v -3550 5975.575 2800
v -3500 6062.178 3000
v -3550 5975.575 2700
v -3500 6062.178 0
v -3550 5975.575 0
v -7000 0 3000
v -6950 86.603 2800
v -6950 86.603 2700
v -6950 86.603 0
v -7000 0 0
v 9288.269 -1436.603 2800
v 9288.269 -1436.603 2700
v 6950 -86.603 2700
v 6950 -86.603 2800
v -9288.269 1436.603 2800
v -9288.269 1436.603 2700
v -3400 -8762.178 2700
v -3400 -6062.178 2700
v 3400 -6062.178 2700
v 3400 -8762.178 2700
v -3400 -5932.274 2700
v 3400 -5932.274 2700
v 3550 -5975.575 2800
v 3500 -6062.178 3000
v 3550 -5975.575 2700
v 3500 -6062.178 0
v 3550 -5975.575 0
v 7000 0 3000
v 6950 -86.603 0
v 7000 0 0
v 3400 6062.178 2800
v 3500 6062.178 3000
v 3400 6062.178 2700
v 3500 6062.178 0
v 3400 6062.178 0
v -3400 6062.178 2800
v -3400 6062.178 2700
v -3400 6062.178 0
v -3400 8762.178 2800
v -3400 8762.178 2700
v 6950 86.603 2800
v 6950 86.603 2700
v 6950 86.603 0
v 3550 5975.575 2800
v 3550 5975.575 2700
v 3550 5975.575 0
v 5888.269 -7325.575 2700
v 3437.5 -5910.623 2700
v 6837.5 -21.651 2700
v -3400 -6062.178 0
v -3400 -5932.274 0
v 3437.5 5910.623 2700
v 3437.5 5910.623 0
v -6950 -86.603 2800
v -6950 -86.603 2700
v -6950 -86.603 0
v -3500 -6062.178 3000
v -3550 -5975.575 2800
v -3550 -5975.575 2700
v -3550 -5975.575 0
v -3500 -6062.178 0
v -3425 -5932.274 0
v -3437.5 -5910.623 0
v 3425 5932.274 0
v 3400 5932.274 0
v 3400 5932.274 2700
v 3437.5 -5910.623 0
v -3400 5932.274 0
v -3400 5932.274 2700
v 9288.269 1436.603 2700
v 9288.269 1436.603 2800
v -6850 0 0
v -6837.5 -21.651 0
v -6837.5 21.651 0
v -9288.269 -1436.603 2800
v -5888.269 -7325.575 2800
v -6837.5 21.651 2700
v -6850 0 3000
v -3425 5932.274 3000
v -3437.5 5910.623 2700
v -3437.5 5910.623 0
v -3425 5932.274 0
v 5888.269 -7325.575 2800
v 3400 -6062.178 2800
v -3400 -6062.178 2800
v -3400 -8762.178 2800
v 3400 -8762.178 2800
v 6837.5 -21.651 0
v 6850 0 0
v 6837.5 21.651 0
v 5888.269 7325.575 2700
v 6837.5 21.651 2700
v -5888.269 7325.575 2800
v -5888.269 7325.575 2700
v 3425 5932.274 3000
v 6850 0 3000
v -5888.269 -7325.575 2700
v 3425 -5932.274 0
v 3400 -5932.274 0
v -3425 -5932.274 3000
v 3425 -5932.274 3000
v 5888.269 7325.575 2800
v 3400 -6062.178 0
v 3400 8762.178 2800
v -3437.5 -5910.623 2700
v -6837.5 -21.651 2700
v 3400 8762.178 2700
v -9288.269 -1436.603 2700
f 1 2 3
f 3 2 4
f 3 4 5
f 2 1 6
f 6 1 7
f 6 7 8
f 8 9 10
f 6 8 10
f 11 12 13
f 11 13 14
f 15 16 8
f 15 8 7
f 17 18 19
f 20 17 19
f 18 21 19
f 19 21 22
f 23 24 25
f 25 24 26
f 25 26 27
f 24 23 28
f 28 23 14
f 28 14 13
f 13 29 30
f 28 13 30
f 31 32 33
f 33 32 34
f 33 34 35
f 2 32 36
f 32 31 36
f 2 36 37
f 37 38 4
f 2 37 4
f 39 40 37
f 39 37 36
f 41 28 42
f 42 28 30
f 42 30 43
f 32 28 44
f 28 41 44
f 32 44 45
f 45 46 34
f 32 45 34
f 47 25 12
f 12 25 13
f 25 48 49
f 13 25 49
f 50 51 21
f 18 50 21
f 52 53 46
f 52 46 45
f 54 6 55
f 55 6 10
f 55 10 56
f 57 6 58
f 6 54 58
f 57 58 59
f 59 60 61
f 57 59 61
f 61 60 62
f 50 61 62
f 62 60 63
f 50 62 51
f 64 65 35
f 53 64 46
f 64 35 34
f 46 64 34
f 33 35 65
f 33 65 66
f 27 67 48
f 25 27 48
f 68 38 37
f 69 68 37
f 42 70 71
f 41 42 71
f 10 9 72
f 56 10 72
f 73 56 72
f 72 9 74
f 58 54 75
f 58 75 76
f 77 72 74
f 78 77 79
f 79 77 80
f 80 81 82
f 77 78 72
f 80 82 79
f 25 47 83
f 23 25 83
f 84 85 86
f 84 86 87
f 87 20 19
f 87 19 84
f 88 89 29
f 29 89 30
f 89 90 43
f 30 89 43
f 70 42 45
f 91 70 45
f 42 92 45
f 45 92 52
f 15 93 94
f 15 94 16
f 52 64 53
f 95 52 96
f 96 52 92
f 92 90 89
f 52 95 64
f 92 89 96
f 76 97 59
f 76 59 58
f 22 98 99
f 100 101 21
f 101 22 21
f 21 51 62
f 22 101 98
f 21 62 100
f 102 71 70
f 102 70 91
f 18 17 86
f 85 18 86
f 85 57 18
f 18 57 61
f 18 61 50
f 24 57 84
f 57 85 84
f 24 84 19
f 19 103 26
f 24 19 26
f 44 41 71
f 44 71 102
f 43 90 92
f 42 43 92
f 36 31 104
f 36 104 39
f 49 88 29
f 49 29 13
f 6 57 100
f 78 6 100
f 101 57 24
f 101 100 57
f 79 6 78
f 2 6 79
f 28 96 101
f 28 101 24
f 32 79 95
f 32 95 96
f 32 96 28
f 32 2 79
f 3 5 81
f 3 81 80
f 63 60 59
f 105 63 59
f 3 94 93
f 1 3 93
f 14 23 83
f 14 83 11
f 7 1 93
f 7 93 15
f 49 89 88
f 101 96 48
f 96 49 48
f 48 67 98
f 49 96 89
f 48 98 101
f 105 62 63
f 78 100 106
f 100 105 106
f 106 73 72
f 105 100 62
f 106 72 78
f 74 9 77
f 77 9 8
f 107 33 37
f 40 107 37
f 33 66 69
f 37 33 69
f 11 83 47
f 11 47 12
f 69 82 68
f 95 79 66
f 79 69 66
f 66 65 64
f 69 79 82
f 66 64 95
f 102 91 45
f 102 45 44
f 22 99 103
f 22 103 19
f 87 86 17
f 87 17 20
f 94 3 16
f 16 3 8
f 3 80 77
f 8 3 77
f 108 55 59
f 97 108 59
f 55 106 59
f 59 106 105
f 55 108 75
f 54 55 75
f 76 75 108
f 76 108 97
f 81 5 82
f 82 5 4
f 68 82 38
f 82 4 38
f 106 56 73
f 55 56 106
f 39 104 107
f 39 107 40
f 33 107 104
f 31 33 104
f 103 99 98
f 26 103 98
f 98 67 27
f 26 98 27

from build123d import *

# Parameters (mm, degrees)
F1_DEPTH  = 3000
F2_W      = 6800
F2_H      = 2700
F3_DEPTH  = 15155.4455662277
F4_W      = 6800
F4_H      = 2700
F5_DEPTH  = 15155.4455662277
F6_W      = 6800
F6_H      = 2700
F7_DEPTH  = 12124.3566529821
F8_W      = 6800
F8_H      = 100
F9_DEPTH  = 2700
F10_W     = 6800
F10_H     = 100
F11_DEPTH = 2700
F12_W     = 6800
F12_H     = 100
F13_DEPTH = 2700
F14_W     = 6800
F14_H     = 100
F15_DEPTH = 2700
F16_W     = 6800
F16_H     = 100
F17_DEPTH = 2700
F18_W     = 6800
F18_H     = 100
F19_DEPTH = 2700


with BuildPart() as f1:
    # F0 (on Top) → F1 (new body)
    with BuildSketch(Plane.XY):
        Polygon((3500, -6062.1778264911), (7000, 0), (3500, 6062.1778264911), (-3500, 6062.1778264911), (-7000, 0), (-3500, -6062.1778264911), align=None)
        Polygon((3425, 5932.2740159234), (6850, 0), (3425, -5932.2740159234), (-3425, -5932.2740159234), (-6850, 0), (-3425, 5932.2740159234), align=None, mode=Mode.SUBTRACT)
    extrude(amount=F1_DEPTH)

    # F2 (on face) → F3 (cut, through all)
    with BuildSketch(Plane(origin=(-5250, -3031.0889132455, 0), x_dir=(0.5, -0.8660254038, 0), z_dir=(-0.8660254038, -0.5, 0))):
        with Locations((0, 1350)):
            Rectangle(F2_W, F2_H)
    extrude(amount=-F3_DEPTH, mode=Mode.SUBTRACT)

    # F4 (on face) → F5 (cut, through all)
    with BuildSketch(Plane(origin=(-5250, 3031.0889132455, 0), x_dir=(-0.5, -0.8660254038, 0), z_dir=(-0.8660254038, 0.5, 0))):
        with Locations((0, 1350)):
            Rectangle(F4_W, F4_H)
    extrude(amount=-F5_DEPTH, mode=Mode.SUBTRACT)

    # F6 (on face) → F7 (cut, through all)
    with BuildSketch(Plane(origin=(0, 6062.1778264911, 0), x_dir=(-1, 0, 0), z_dir=(0, 1, 0))):
        with Locations((0, 1350)):
            Rectangle(F6_W, F6_H)
    extrude(amount=-F7_DEPTH, mode=Mode.SUBTRACT)

    # F8 (on face) → F9 (join)
    with BuildSketch(Plane(origin=(0, 6062.1778264911, 0), x_dir=(-1, 0, 0), z_dir=(0, 1, 0))):
        with Locations((0, 2750)):
            Rectangle(F8_W, F8_H)
    extrude(amount=F9_DEPTH)

    # F10 (on face) → F11 (join)
    with BuildSketch(Plane(origin=(5250, 3031.0889132455, 0), x_dir=(-0.5, 0.8660254038, 0), z_dir=(0.8660254038, 0.5, 0))):
        with Locations((0, 2750)):
            Rectangle(F10_W, F10_H)
    extrude(amount=F11_DEPTH)

    # F12 (on face) → F13 (join)
    with BuildSketch(Plane(origin=(5250, -3031.0889132455, 0), x_dir=(0.5, 0.8660254038, 0), z_dir=(0.8660254038, -0.5, 0))):
        with Locations((0, 2750)):
            Rectangle(F12_W, F12_H)
    extrude(amount=F13_DEPTH)

    # F14 (on face) → F15 (join)
    with BuildSketch(Plane.XZ.offset(6062.1778264911)):
        with Locations((0, 2750)):
            Rectangle(F14_W, F14_H)
    extrude(amount=F15_DEPTH)

    # F16 (on face) → F17 (join)
    with BuildSketch(Plane(origin=(-5250, -3031.0889132455, 0), x_dir=(0.5, -0.8660254038, 0), z_dir=(-0.8660254038, -0.5, 0))):
        with Locations((0, 2750)):
            Rectangle(F16_W, F16_H)
    extrude(amount=F17_DEPTH)

    # F18 (on face) → F19 (join)
    with BuildSketch(Plane(origin=(-5250, 3031.0889132455, 0), x_dir=(-0.5, -0.8660254038, 0), z_dir=(-0.8660254038, 0.5, 0))):
        with Locations((0, 2750)):
            Rectangle(F18_W, F18_H)
    extrude(amount=F19_DEPTH)


solid = f1.part
